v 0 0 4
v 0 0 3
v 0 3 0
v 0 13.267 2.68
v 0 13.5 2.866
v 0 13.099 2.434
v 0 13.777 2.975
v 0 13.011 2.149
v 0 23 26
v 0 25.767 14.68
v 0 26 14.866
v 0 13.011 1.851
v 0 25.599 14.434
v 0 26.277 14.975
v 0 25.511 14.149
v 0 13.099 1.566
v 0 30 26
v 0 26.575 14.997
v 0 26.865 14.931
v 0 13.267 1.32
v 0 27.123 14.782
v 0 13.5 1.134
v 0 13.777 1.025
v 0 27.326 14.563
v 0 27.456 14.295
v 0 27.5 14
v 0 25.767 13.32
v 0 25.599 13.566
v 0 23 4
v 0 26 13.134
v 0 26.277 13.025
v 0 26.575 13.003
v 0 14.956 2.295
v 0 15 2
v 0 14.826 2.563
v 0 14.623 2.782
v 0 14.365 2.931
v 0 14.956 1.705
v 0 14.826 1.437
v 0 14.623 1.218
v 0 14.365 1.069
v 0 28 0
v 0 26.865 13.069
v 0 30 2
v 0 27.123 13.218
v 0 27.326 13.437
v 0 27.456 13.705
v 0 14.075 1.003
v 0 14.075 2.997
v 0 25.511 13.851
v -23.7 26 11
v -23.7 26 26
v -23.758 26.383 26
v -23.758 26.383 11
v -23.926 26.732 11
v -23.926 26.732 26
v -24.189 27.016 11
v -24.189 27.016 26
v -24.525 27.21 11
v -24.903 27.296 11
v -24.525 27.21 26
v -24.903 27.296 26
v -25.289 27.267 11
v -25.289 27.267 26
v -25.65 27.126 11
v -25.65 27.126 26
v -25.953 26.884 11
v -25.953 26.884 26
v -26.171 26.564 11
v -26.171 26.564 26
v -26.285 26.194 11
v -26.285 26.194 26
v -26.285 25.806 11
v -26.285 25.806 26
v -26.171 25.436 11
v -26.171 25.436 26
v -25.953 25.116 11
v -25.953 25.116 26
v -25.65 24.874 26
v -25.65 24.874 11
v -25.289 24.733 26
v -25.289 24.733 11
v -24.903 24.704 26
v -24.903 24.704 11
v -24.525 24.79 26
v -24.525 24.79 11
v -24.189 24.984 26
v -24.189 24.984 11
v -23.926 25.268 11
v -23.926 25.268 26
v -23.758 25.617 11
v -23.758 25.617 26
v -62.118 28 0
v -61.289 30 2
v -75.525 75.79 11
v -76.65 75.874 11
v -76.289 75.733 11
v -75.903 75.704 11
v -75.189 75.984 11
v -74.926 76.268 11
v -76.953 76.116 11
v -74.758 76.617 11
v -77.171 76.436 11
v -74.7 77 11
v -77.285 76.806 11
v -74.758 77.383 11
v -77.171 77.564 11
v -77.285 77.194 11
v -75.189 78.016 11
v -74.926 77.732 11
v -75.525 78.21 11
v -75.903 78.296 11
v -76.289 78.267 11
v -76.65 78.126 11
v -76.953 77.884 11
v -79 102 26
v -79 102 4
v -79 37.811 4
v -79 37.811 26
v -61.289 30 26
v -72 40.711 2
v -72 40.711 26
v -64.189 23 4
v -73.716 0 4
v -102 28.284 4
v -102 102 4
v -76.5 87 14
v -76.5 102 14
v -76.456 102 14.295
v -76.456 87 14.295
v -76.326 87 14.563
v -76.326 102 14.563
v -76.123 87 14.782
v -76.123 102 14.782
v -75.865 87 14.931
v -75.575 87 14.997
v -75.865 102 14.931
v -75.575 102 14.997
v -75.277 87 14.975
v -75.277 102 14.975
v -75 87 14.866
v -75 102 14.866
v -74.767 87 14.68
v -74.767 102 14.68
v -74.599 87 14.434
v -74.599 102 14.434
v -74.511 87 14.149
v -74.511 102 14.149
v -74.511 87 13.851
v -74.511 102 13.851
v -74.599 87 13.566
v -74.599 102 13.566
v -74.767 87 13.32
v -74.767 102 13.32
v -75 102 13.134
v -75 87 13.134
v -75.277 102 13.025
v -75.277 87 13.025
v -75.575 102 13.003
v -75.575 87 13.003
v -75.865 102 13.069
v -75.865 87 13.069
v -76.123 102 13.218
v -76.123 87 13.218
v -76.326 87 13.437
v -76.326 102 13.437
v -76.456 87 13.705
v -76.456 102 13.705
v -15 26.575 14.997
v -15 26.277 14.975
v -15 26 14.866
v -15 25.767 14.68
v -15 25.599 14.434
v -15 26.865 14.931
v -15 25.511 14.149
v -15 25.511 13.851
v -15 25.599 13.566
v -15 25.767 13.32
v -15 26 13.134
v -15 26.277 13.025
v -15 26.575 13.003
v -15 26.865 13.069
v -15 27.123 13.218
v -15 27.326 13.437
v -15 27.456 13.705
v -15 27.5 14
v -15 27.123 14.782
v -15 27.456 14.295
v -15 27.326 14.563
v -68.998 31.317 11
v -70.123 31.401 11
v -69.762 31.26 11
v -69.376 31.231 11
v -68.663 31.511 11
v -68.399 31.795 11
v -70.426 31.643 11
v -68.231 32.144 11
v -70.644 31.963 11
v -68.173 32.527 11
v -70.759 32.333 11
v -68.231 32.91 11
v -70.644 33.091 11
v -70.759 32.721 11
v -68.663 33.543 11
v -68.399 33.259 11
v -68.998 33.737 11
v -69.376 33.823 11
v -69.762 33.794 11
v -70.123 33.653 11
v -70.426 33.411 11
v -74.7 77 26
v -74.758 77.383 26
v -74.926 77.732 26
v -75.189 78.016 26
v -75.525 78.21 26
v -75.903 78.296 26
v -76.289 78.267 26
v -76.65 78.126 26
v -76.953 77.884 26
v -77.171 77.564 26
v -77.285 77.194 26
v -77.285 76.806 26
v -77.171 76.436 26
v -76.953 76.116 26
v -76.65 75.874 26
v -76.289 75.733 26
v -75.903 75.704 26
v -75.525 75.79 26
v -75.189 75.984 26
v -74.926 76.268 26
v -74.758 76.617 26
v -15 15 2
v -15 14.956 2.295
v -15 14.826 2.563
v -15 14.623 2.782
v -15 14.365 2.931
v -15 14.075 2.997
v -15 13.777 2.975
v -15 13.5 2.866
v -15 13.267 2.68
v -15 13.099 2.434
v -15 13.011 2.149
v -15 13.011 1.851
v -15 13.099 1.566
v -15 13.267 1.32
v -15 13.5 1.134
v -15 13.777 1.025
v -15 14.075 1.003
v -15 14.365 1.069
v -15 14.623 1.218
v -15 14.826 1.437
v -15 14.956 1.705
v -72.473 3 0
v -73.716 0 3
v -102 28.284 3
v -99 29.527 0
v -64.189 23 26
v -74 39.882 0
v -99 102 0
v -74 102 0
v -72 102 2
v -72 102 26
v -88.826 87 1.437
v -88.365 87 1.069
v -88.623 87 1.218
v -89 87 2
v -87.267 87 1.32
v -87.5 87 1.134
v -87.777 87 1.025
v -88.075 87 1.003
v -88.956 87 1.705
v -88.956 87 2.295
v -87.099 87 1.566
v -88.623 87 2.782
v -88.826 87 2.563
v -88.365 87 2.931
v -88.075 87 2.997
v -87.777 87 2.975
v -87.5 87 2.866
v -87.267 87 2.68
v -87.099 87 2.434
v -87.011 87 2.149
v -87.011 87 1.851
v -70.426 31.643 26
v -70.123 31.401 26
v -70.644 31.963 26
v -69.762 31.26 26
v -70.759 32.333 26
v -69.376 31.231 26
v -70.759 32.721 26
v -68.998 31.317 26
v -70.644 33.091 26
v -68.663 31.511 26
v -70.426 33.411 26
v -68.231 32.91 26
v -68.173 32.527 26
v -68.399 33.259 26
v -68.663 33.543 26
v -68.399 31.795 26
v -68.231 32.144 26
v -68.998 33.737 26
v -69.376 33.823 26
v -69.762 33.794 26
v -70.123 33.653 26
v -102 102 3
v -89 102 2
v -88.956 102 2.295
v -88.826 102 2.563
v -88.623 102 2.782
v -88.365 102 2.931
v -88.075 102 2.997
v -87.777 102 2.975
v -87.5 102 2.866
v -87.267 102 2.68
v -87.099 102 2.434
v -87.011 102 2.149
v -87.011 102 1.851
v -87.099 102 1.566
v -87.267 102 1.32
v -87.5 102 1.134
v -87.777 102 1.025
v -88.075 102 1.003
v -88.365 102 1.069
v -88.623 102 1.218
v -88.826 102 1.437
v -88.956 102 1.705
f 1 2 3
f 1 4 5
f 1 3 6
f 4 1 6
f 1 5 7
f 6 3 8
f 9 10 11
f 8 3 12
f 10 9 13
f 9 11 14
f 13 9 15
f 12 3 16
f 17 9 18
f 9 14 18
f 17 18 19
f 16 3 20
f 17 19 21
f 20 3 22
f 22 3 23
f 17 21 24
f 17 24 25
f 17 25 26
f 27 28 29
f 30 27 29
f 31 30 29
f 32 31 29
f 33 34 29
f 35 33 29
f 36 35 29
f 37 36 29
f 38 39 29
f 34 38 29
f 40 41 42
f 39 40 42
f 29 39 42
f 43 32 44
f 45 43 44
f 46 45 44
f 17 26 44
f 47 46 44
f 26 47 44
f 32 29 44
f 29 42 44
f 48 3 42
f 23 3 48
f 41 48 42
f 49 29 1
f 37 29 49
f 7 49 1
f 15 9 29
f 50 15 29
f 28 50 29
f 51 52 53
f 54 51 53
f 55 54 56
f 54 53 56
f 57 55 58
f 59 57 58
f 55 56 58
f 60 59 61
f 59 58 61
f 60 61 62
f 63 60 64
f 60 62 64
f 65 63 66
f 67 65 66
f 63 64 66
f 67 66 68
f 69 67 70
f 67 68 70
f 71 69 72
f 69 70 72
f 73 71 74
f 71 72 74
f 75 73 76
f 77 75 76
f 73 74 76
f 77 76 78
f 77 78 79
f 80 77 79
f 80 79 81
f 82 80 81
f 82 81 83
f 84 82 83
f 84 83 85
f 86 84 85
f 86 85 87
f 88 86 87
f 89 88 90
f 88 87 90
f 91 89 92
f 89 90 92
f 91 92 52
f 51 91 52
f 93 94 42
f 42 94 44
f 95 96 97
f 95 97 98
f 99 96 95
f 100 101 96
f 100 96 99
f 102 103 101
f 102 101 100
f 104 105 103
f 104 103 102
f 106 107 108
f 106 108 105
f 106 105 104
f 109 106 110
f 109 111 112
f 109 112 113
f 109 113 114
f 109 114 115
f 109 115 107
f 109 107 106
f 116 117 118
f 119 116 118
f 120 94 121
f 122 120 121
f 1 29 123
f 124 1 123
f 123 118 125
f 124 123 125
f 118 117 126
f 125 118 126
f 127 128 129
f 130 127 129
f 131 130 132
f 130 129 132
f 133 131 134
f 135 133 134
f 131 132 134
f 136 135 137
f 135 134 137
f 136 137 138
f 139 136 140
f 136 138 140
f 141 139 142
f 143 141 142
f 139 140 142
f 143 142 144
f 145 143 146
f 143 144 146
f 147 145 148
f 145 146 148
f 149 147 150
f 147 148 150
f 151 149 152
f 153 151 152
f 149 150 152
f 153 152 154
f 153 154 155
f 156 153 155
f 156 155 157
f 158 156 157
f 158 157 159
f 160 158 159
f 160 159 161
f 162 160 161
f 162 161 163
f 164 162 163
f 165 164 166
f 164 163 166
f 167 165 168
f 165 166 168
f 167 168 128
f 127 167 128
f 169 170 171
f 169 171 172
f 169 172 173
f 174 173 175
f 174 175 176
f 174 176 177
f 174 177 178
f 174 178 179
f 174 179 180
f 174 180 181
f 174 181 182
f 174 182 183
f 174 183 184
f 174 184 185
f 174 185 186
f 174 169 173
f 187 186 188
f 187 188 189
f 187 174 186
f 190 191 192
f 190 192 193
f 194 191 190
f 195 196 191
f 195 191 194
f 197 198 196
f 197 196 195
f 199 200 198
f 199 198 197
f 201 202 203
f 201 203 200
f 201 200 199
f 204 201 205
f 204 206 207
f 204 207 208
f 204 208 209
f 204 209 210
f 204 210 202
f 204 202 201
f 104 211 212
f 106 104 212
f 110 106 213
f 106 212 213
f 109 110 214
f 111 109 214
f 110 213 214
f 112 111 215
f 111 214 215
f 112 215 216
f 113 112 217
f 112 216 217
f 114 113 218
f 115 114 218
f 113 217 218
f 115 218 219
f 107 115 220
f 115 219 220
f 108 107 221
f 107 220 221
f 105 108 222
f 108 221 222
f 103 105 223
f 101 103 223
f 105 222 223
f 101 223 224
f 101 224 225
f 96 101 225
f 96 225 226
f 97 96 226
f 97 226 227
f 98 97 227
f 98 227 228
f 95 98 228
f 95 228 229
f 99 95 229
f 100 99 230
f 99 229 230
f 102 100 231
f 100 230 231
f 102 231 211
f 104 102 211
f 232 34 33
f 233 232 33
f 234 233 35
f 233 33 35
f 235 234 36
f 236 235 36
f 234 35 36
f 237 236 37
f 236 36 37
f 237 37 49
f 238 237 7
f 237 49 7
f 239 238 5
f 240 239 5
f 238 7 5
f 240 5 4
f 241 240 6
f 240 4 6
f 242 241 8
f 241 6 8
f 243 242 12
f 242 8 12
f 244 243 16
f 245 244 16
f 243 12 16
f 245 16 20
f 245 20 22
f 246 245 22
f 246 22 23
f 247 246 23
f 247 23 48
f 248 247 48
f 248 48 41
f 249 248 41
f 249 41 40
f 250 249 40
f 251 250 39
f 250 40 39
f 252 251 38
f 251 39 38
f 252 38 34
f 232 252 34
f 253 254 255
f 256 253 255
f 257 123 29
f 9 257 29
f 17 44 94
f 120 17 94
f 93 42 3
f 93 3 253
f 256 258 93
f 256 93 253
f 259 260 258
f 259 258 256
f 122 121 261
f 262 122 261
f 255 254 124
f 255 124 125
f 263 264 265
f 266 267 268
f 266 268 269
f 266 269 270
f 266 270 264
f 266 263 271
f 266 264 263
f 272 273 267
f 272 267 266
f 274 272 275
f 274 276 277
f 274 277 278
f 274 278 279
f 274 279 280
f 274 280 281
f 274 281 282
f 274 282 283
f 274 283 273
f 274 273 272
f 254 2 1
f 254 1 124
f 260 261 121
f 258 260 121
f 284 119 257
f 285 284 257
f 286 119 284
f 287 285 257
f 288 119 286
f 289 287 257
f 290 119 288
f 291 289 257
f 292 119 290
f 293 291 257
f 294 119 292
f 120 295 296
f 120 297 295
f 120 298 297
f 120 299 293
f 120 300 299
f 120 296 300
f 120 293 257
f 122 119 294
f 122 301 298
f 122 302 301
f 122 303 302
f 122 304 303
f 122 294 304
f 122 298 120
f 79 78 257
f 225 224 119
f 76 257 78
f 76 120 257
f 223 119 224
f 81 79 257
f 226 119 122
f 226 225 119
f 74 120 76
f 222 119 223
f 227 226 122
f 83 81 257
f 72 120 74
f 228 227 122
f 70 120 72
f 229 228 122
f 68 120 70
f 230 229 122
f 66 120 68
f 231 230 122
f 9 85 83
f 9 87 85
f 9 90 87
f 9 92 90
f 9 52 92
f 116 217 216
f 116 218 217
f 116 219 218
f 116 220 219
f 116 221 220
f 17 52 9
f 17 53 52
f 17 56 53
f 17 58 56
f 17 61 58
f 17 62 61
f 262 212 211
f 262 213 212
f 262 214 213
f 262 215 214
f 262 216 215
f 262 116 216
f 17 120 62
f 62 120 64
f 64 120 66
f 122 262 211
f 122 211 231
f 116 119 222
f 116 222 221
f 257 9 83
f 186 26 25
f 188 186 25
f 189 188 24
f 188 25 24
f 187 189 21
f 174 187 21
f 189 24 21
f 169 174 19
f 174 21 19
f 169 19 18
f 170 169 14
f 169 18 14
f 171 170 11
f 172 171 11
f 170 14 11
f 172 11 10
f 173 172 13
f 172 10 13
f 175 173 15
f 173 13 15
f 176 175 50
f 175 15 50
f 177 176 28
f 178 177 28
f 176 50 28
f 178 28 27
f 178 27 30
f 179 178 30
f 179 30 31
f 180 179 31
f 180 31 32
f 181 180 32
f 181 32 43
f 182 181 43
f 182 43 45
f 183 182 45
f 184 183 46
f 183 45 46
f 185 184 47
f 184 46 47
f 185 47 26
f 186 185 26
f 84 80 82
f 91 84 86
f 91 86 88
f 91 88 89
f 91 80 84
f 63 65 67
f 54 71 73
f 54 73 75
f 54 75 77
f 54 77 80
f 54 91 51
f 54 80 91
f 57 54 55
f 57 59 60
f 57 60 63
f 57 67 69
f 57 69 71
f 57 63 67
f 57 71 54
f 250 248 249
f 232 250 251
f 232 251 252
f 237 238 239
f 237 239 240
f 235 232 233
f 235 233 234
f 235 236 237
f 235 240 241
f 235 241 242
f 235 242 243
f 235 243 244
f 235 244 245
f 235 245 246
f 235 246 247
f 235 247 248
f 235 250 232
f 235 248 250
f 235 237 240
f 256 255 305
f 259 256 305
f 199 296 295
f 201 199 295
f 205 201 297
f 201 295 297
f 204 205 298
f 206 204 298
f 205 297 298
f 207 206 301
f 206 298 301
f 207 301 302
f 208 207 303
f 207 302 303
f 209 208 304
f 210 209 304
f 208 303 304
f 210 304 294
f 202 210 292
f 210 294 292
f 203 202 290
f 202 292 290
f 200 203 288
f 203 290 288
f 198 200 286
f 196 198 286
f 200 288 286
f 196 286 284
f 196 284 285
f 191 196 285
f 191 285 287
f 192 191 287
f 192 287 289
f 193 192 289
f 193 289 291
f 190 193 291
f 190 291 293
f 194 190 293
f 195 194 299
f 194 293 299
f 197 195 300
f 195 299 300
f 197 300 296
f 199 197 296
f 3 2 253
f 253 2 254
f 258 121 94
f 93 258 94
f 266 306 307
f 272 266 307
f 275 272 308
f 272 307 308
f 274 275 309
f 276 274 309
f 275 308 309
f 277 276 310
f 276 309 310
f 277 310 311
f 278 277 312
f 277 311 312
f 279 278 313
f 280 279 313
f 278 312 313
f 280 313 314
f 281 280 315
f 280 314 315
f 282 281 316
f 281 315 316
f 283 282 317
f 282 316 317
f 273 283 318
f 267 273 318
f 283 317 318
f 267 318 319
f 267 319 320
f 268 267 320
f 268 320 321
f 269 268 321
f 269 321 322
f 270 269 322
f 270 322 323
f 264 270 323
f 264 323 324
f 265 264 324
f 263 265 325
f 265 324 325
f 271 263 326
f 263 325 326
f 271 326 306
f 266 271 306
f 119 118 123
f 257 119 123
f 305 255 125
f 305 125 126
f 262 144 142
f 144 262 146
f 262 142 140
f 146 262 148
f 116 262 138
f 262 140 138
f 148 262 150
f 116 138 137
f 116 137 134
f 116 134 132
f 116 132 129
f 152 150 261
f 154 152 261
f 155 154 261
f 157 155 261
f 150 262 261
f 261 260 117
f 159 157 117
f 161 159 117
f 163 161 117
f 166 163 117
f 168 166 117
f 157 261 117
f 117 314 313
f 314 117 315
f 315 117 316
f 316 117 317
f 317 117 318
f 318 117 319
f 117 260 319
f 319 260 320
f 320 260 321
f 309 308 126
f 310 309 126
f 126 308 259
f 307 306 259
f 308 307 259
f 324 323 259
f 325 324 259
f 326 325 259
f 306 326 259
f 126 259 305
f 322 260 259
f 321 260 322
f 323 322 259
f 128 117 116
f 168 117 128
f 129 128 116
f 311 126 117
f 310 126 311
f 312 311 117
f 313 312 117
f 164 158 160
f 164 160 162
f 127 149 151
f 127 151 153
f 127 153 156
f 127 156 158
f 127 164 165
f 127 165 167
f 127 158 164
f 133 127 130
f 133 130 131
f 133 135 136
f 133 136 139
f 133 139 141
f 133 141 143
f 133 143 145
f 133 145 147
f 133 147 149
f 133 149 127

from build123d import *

# Parameters (mm, degrees)
PAD_DEPTH       = 4
PAD001_DEPTH    = 22
CHAMFER_SIZE    = 3
CHAMFER001_SIZE = 2
SKETCH002_R     = 1.3
POCKET_DEPTH    = 15
SKETCH003_R     = 1
POCKET001_DEPTH = 15
SKETCH004_R     = 1
POCKET002_DEPTH = 15


with BuildPart() as part:
    # Sketch → Pad (new body)
    with BuildSketch(Plane.XY):
        Polygon((0, 0), (-73.715729, 0), (-102, 28.284271), (-102, 102), (-72, 102), (-72, 40.710678), (-61.289322, 30), (0, 30), align=None)
    extrude(amount=PAD_DEPTH)

    # Sketch001 (on Face10 of Pad) → Pad001 (join)
    with BuildSketch(Plane.XY.offset(4)):
        Polygon((0, 30), (-61.289322, 30), (-72, 40.710678), (-72, 102), (-79, 102), (-79, 37.811183), (-64.188817, 23), (0, 23), align=None)
    extrude(amount=PAD001_DEPTH)

    # Chamfer
    chamfer_edges = [part.edges().sort_by_distance(p)[0] for p in [
        (-102, 65.142136, 0),
        (-87.857864, 14.142136, 0),
        (-36.857864, 0, 0),
    ]]
    chamfer(chamfer_edges, length=CHAMFER_SIZE)

    # Chamfer001
    chamfer001_edges = [part.edges().sort_by_distance(p)[0] for p in [
        (-72, 71.355339, 0),
        (-66.644661, 35.355339, 0),
        (-30.644661, 30, 0),
    ]]
    chamfer(chamfer001_edges, length=CHAMFER001_SIZE)

    # Sketch002 (on Face18 of Chamfer001) → Pocket (cut)
    with BuildSketch(Plane.XY.offset(26)):
        with Locations((-76, 77)):
            Circle(SKETCH002_R)
        with Locations((-69.473088, 32.526912)):
            Circle(SKETCH002_R)
        with Locations((-25, 26)):
            Circle(SKETCH002_R)
    extrude(amount=-POCKET_DEPTH, mode=Mode.SUBTRACT)

    # Sketch003 (on Face7 of Pocket) → Pocket001 (cut)
    with BuildSketch(Plane.YZ):
        with Locations((26.5, 14)):
            Circle(SKETCH003_R)
        with Locations((14, 2)):
            Circle(SKETCH003_R)
    extrude(amount=-POCKET001_DEPTH, mode=Mode.SUBTRACT)

    # Sketch004 (on Face26 of Pocket001) → Pocket002 (cut)
    with BuildSketch(Plane(origin=(0, 102, 0), x_dir=(-1, 0, 0), z_dir=(0, 1, 0))):
        with Locations((75.5, 14)):
            Circle(SKETCH004_R)
        with Locations((88, 2)):
            Circle(SKETCH004_R)
    extrude(amount=-POCKET002_DEPTH, mode=Mode.SUBTRACT)


solid = part.part
